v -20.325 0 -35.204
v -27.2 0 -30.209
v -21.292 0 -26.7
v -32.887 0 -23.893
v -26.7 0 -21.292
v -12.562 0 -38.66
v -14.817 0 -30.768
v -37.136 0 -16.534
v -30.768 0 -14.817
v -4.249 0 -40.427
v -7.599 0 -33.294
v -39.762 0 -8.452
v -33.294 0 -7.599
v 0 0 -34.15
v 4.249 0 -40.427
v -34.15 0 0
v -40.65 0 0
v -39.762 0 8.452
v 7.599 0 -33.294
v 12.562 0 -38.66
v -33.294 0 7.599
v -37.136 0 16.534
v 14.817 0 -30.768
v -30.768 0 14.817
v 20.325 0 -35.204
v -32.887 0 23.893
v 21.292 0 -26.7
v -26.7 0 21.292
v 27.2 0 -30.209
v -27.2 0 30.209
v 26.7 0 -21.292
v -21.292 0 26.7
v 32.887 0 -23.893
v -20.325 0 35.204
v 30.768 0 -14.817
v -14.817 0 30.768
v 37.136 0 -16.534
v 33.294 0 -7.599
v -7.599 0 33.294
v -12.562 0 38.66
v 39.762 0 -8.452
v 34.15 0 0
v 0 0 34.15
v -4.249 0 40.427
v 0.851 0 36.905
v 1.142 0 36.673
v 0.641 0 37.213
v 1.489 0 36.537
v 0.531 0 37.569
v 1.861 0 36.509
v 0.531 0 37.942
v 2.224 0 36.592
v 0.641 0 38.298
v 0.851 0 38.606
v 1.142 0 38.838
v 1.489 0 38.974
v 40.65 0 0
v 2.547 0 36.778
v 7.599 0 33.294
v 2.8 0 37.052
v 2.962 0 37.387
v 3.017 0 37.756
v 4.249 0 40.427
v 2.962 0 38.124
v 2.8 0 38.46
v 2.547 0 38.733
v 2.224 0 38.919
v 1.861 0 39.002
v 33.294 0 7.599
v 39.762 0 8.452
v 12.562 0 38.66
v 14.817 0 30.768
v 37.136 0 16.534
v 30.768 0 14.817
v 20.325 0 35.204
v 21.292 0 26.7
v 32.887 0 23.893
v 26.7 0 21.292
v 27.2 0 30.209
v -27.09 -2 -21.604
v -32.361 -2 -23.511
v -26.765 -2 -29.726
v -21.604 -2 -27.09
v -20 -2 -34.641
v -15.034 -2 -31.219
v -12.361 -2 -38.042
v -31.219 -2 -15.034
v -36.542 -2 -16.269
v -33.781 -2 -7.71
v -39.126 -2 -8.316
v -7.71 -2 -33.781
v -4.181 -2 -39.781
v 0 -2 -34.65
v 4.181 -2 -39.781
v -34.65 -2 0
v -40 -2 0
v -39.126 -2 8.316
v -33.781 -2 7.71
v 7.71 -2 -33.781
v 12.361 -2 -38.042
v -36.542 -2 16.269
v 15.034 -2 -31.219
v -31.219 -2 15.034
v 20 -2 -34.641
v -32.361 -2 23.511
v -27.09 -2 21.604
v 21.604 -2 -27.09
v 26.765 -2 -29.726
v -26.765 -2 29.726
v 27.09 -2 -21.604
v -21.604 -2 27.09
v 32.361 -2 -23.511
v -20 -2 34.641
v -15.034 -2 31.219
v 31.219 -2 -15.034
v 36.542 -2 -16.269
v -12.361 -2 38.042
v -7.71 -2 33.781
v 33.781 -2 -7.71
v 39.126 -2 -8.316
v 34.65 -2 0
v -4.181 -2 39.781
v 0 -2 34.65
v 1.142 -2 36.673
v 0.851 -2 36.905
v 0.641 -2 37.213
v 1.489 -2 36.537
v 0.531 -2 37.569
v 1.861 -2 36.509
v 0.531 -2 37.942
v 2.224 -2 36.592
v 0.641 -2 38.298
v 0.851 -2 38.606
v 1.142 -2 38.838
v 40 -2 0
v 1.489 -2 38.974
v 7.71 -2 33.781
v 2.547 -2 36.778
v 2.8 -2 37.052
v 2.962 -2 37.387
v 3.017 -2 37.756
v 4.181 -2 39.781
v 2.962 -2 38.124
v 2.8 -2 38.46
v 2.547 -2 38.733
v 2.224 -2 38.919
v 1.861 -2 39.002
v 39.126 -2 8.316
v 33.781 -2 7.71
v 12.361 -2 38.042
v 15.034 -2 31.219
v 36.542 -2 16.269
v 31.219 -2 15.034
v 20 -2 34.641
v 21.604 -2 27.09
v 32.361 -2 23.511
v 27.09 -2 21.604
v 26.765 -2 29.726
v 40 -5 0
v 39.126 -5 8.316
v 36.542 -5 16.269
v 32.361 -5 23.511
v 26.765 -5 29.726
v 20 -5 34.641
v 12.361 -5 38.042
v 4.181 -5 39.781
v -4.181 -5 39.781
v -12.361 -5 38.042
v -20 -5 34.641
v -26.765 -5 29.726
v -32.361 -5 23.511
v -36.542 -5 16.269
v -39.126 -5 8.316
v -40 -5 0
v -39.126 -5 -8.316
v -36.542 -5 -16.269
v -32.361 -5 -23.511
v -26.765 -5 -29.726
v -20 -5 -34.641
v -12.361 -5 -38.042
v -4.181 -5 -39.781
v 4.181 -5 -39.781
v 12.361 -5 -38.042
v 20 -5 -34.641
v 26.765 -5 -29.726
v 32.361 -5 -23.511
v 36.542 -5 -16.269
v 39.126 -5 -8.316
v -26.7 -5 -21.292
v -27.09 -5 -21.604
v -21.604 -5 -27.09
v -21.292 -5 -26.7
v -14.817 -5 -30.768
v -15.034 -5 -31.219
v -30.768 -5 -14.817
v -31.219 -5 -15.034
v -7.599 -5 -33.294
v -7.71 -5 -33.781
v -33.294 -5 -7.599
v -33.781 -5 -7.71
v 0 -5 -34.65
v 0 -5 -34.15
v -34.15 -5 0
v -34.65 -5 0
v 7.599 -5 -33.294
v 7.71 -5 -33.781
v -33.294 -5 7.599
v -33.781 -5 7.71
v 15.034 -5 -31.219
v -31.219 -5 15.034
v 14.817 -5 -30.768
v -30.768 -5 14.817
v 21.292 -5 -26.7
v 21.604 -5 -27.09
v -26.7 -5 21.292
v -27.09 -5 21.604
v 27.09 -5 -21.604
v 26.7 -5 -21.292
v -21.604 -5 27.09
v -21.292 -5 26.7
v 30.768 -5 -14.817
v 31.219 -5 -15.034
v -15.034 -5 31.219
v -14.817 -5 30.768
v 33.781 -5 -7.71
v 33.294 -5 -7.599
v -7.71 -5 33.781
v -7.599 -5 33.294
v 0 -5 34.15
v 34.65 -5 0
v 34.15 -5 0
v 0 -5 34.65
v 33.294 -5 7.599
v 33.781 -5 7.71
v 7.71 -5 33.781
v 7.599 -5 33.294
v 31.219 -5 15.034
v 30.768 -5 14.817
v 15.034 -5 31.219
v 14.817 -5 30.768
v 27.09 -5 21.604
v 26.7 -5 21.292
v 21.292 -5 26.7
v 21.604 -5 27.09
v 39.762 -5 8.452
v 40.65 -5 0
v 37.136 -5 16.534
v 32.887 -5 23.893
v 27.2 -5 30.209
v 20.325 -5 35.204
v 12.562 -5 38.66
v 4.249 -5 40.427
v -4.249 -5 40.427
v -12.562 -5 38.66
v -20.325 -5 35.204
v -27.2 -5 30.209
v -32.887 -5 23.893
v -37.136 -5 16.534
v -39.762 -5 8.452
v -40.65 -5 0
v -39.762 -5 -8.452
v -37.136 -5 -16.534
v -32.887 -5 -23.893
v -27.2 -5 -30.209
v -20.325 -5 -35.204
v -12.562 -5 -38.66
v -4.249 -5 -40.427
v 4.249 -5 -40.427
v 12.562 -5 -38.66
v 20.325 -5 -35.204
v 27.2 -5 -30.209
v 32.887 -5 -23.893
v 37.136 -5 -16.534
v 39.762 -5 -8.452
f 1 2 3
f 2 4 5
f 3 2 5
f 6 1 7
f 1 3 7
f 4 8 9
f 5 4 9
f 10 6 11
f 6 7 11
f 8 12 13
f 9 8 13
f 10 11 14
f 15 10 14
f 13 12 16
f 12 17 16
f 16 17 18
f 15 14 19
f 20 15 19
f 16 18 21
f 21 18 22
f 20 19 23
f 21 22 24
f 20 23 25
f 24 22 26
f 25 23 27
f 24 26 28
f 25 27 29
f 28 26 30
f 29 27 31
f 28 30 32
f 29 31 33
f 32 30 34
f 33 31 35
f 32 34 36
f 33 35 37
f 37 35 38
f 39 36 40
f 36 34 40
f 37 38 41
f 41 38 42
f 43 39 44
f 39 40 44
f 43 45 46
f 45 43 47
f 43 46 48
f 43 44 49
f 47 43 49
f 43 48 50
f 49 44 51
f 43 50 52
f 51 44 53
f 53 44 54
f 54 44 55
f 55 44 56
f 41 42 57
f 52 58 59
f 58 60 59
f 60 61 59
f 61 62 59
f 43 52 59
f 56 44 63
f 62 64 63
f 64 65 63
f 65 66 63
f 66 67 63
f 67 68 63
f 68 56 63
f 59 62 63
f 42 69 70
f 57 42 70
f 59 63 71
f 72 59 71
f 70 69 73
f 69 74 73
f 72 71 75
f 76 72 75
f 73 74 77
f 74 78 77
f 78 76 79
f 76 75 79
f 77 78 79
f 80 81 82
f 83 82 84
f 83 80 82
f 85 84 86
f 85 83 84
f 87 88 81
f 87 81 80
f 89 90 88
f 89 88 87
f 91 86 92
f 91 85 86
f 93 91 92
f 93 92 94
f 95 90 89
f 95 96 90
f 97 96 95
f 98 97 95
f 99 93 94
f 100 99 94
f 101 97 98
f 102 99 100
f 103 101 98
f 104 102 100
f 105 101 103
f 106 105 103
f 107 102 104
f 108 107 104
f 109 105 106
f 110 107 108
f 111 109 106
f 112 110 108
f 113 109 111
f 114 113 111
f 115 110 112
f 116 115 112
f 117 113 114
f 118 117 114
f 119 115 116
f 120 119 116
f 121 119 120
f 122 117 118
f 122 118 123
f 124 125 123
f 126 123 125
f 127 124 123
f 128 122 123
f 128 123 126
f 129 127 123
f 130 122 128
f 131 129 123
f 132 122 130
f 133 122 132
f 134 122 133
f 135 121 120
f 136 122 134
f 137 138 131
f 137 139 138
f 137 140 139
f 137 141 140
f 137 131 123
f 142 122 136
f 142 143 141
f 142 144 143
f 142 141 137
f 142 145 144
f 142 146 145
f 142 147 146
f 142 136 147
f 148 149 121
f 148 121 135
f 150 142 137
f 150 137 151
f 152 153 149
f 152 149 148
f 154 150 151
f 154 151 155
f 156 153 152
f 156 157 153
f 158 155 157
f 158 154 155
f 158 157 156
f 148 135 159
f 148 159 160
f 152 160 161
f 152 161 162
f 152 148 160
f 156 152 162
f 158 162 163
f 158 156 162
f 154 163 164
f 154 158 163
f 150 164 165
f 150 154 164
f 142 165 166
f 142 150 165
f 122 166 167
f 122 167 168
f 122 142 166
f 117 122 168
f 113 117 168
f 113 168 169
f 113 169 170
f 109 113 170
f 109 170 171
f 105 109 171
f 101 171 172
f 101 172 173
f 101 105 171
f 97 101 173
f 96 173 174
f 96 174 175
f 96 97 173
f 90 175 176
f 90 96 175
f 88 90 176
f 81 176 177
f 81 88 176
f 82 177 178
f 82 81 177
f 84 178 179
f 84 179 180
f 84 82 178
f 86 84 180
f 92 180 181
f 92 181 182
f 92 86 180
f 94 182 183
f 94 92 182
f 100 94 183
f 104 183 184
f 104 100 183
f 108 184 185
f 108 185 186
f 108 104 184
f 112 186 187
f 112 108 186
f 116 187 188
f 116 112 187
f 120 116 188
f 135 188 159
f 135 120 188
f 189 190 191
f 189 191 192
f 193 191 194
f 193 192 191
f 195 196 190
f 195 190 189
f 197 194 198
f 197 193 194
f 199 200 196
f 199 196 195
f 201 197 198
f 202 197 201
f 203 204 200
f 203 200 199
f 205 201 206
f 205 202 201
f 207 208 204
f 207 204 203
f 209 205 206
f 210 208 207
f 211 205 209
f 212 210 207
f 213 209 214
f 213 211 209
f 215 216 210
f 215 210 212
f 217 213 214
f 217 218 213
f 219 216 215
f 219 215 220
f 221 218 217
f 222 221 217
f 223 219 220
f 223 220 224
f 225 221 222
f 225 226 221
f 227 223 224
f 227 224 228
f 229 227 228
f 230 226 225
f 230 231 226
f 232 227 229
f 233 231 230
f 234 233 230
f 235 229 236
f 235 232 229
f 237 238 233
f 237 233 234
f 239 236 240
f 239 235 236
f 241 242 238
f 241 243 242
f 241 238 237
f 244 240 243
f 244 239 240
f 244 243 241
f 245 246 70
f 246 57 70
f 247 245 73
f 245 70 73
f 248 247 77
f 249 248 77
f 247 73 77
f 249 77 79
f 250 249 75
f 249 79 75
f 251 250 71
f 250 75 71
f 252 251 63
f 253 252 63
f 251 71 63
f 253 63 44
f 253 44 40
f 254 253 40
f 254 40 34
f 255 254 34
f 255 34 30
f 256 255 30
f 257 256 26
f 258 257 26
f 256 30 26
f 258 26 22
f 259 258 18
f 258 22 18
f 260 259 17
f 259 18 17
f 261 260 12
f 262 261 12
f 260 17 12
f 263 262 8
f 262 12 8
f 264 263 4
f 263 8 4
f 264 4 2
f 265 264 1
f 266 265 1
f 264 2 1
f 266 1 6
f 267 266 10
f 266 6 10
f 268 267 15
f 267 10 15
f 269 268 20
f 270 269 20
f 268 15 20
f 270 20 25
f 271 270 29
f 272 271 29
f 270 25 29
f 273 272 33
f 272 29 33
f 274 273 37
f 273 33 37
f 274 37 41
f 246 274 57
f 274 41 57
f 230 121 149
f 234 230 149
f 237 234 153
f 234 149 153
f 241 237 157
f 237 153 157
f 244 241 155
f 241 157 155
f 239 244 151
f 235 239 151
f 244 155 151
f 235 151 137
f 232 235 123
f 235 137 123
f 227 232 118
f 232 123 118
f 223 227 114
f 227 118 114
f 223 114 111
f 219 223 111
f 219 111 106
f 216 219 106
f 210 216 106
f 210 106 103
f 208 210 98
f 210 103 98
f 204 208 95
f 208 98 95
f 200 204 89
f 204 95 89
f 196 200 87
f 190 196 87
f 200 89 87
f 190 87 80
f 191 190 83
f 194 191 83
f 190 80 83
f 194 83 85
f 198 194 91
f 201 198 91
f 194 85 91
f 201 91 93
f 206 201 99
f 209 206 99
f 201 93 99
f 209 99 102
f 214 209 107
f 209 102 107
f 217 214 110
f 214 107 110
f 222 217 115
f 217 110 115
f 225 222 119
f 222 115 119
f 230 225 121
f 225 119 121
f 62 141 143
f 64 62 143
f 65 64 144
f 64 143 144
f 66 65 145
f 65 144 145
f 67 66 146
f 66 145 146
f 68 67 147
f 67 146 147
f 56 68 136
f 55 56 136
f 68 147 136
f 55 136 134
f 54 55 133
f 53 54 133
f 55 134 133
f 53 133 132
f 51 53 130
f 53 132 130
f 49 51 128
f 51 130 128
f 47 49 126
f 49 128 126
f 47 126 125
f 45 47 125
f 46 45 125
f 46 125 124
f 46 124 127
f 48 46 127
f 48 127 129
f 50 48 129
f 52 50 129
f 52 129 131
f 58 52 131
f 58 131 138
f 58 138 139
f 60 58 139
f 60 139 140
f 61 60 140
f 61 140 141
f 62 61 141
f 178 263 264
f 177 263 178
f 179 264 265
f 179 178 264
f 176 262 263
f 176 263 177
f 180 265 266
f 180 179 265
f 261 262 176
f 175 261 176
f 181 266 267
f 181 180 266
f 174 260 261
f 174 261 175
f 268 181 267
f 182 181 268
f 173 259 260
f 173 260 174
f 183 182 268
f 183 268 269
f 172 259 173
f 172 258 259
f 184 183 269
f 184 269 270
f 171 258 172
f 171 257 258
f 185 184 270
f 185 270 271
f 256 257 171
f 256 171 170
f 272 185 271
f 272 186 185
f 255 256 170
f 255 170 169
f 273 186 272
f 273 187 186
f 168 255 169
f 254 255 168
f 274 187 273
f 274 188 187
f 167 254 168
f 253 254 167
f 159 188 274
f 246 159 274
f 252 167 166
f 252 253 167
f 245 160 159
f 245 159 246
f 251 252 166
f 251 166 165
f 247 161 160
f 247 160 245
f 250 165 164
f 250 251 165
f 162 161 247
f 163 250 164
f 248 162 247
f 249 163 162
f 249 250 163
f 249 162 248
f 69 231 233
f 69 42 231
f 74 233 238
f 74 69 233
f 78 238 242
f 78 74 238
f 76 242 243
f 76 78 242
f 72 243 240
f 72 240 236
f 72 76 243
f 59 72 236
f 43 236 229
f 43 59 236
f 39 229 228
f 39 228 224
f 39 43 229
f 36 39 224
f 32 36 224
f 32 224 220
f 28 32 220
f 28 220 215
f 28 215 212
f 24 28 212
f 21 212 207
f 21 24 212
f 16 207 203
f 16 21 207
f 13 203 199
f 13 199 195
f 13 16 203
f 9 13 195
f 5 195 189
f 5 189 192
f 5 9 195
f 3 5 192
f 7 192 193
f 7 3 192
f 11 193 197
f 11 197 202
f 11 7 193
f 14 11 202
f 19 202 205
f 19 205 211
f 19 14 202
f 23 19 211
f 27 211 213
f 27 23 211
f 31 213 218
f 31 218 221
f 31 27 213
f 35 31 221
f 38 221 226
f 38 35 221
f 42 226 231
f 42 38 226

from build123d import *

# Parameters (mm, degrees)
F0_R     = 40.65
F0_R_2   = 34.15
F1_DEPTH = 2
F2_R     = 40.65
F2_R_2   = 40
F3_DEPTH = 3
F4_R     = 34.65
F4_R_2   = 34.15
F5_DEPTH = 3
F6_R     = 1.25
F7_DEPTH = 25


with BuildPart() as f1:
    # F0 (on Front) → F1 (new body)
    with BuildSketch(Plane.XZ):
        Circle(F0_R)
        Circle(F0_R_2, mode=Mode.SUBTRACT)
    extrude(amount=F1_DEPTH)

    # F2 (on face) → F3 (join)
    with BuildSketch(Plane.XZ.offset(2)):
        Circle(F2_R)
        Circle(F2_R_2, mode=Mode.SUBTRACT)
    extrude(amount=F3_DEPTH)

    # F4 (on face) → F5 (join)
    with BuildSketch(Plane.XZ.offset(2)):
        Circle(F4_R)
        Circle(F4_R_2, mode=Mode.SUBTRACT)
    extrude(amount=F5_DEPTH)

    # F6 (on face) → F7 (cut)
    with BuildSketch(Plane.XZ.offset(2)):
        with Locations((1.767338, 37.755713)):
            Circle(F6_R)
    extrude(amount=-F7_DEPTH, mode=Mode.SUBTRACT)


solid = f1.part
